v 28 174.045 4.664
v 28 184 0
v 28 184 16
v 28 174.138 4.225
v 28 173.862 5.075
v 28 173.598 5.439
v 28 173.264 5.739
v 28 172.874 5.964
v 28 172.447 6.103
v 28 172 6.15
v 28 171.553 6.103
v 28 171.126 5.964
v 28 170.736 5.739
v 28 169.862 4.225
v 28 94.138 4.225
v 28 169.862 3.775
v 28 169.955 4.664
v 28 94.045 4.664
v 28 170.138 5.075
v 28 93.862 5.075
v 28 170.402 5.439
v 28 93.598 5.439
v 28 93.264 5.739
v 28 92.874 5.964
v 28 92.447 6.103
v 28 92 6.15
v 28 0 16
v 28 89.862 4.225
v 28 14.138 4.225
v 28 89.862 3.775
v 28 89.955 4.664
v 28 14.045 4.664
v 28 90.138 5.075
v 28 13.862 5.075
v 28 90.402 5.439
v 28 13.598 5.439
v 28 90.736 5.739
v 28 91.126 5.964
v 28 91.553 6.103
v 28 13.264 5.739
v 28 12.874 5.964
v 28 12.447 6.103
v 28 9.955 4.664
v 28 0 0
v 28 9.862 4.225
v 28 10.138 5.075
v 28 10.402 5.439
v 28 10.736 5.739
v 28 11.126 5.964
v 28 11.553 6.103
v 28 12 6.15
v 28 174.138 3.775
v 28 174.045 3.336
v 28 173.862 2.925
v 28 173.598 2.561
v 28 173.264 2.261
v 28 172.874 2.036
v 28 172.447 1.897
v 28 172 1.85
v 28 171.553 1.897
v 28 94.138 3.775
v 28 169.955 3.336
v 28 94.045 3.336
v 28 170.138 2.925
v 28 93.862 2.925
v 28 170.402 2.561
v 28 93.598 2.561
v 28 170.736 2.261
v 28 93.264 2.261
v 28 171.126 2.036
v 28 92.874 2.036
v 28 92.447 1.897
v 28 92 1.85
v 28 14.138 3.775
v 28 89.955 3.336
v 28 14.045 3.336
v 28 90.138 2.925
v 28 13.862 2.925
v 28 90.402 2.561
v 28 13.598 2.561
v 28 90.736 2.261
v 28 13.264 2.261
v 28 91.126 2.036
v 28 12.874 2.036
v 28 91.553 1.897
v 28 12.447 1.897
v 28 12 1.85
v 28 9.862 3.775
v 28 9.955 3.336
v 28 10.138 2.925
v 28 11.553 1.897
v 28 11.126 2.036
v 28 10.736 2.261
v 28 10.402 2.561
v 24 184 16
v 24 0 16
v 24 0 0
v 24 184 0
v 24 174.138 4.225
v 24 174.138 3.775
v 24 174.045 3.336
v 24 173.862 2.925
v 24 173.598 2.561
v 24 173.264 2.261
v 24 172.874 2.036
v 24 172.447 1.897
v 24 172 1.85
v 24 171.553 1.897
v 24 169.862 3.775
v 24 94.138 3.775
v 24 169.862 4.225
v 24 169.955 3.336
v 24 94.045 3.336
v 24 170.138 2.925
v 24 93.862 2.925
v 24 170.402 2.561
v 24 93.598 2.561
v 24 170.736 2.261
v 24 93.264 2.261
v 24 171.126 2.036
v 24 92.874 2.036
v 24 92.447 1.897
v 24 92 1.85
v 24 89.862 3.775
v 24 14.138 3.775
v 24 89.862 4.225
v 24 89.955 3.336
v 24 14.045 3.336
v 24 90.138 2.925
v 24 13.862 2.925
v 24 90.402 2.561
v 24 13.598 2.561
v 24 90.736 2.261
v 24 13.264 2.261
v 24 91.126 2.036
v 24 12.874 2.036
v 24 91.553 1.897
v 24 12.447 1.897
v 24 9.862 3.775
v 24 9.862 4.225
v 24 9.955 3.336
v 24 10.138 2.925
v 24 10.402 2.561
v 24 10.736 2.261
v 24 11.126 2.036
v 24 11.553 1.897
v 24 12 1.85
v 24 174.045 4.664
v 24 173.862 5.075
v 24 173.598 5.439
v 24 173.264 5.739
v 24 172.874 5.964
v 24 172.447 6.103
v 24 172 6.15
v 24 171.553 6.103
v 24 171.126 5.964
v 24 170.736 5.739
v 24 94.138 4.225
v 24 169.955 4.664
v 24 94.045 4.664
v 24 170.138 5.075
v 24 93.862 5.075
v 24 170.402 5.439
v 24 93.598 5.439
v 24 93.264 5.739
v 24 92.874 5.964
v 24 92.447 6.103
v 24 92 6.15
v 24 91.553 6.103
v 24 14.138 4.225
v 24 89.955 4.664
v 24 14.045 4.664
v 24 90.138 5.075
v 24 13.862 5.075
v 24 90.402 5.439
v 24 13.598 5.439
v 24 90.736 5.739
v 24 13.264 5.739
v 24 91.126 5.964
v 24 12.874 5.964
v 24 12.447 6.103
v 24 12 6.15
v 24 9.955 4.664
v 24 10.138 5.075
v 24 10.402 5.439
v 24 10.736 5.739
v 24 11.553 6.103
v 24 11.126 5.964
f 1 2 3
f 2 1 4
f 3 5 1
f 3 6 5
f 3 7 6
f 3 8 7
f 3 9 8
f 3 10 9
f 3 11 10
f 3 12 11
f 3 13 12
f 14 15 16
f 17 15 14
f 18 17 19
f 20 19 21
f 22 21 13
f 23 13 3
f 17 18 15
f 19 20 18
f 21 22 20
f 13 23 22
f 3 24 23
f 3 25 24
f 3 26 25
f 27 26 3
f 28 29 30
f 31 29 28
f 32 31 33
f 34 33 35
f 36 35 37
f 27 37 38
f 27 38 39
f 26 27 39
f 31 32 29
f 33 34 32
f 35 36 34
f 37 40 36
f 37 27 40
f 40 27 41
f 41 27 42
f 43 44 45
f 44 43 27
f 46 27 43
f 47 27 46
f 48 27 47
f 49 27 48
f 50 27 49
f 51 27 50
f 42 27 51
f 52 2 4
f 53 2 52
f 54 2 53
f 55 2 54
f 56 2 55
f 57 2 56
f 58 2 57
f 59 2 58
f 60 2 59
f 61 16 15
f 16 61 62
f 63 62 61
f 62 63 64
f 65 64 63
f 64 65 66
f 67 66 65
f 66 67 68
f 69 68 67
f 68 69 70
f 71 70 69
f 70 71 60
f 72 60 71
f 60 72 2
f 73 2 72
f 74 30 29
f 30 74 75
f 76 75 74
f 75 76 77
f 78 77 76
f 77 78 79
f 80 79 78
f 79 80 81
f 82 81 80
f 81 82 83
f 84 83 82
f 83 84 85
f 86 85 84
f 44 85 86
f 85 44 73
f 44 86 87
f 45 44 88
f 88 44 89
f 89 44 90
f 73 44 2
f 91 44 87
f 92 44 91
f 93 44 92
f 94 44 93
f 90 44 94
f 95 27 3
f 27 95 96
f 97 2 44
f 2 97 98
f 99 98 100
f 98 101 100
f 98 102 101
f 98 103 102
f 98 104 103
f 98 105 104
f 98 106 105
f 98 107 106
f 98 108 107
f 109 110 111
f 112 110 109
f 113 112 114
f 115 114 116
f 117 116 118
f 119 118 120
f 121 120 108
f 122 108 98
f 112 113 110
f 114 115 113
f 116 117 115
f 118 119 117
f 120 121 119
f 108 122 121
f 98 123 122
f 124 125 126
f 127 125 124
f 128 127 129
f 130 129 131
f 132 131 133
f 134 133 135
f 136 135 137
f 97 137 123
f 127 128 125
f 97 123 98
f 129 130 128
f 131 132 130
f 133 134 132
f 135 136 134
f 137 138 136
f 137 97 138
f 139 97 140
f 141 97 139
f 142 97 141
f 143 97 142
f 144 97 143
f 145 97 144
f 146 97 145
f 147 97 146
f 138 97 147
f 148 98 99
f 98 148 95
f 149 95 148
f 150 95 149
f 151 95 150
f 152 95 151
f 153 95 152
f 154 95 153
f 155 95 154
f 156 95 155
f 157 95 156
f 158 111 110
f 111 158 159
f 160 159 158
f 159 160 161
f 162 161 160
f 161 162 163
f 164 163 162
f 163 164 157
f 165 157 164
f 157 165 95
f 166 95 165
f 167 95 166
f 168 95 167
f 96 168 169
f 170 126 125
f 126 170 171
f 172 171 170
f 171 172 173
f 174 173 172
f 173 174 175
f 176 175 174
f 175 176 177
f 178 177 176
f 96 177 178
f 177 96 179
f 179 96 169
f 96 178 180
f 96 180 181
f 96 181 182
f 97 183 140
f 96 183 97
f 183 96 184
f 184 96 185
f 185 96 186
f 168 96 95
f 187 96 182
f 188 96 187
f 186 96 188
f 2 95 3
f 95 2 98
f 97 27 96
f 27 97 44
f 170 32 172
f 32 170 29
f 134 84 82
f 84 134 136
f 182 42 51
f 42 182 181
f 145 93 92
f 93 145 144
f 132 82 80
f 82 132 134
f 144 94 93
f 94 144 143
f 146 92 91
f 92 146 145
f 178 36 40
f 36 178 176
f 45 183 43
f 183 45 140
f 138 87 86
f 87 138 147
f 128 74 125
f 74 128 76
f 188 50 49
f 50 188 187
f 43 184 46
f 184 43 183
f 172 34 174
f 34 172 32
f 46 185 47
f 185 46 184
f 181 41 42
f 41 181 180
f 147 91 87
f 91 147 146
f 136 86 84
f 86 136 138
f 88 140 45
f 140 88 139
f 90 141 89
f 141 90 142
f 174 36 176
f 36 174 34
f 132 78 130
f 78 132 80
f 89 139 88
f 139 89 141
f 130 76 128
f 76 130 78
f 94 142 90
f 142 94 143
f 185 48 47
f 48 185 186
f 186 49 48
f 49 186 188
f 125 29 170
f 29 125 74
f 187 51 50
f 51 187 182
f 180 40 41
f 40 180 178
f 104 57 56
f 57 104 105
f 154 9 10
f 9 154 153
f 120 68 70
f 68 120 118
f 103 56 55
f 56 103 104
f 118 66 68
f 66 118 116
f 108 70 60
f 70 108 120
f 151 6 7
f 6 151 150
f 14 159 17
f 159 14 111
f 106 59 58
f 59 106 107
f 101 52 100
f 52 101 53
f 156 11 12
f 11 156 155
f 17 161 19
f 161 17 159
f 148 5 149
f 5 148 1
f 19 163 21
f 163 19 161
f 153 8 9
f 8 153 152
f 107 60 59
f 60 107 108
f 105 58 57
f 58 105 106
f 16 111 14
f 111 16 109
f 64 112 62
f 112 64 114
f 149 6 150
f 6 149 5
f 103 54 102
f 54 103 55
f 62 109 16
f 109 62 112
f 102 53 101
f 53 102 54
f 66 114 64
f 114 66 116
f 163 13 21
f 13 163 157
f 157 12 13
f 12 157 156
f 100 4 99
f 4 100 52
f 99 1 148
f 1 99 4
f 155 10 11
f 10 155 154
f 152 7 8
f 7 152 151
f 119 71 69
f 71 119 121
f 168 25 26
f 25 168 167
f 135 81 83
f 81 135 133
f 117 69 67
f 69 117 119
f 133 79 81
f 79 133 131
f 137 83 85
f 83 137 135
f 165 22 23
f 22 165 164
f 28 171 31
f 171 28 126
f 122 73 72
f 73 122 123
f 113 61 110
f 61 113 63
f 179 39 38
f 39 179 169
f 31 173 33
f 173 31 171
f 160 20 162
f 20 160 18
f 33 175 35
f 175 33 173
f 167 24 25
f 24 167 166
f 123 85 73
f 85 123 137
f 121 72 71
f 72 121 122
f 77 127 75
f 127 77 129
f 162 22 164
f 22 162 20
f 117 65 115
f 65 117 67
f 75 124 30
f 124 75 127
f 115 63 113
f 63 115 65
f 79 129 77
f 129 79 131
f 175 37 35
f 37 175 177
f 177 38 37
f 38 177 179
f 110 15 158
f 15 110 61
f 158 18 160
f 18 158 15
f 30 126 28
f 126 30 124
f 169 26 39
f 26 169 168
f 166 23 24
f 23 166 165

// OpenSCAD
difference() {
union () {
    translate([24,0,0])
    cube([4,184,16]);
}
    translate([-4,12,4])
    rotate([0,90,0])
    cylinder(r=2.15,60, $fn=30);
    
    translate([-4,172,4])
    rotate([0,90,0])
    cylinder(r=2.15,60, $fn=30);
    
    translate([-4,92,4])
    rotate([0,90,0])
    cylinder(r=2.15,60, $fn=30);
}
